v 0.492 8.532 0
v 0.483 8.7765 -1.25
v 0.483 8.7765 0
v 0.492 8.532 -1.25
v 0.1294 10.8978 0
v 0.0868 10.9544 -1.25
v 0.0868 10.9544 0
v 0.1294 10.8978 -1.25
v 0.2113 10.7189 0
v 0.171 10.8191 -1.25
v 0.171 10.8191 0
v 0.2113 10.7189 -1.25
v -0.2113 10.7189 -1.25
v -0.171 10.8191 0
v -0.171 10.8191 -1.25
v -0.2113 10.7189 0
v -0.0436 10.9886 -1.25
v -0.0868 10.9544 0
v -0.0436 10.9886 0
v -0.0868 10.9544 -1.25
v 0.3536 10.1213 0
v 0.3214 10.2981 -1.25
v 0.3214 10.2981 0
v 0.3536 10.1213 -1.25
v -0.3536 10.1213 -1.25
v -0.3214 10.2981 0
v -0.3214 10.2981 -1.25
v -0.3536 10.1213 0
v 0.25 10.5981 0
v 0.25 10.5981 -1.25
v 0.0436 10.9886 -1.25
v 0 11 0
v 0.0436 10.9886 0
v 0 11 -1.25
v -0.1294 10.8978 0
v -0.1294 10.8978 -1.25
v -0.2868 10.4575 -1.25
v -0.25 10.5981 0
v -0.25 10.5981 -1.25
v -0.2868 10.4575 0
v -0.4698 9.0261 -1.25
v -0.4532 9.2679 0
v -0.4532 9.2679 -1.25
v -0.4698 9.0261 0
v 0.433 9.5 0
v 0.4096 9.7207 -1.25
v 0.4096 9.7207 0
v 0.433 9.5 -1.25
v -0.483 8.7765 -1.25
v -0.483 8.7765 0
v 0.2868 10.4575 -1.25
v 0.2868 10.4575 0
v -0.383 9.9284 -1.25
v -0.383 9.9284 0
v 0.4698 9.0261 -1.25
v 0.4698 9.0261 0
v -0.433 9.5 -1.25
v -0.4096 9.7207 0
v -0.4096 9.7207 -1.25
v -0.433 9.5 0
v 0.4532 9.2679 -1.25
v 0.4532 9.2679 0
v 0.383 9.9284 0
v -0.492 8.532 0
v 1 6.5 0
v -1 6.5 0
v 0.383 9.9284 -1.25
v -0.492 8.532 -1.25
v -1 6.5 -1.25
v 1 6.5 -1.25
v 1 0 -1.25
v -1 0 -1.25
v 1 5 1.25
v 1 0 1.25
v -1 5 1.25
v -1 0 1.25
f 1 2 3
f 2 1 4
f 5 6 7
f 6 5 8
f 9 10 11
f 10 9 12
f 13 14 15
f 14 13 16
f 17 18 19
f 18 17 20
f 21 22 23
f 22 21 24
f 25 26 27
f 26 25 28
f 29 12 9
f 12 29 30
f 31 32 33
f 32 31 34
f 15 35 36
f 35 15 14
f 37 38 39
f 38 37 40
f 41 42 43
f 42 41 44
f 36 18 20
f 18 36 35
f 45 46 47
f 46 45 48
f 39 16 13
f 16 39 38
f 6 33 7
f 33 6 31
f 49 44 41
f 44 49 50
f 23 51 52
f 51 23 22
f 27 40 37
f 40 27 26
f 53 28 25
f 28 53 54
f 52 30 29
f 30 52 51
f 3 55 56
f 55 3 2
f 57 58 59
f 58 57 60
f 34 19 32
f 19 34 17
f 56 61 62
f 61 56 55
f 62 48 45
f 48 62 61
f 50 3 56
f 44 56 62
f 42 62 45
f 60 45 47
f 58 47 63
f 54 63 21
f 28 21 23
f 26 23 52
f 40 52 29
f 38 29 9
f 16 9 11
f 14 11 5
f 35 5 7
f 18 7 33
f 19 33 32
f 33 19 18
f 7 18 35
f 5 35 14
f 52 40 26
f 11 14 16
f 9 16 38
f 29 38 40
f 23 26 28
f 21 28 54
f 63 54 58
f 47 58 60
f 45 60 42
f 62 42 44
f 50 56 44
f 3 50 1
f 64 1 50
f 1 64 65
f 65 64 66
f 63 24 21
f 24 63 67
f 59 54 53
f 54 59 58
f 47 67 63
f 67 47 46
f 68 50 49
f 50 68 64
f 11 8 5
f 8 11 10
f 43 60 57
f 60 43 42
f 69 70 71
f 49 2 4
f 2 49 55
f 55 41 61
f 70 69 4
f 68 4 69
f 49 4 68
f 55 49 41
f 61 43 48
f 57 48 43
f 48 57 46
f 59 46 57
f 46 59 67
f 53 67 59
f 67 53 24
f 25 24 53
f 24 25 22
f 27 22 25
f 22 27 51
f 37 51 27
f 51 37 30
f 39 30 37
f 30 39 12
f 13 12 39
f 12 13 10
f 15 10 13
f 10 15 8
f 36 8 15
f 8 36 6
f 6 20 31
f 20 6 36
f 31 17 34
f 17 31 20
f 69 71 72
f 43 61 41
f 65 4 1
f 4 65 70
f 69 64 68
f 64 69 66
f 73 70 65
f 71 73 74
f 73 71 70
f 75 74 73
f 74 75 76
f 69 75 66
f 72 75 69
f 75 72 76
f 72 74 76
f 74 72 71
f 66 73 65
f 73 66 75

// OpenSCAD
$fn = 72;


tailSegment(h=4.5);
//blade();

module tailSegment(h=4.5)
{
	translate([0, 4.5, 0])
	union()
	{
		base();
		translate([0, 0.5, 0])
		wedge(height=h);
		translate([0, (h * (2/3)) + 0.5, -.625])
		spine(height=h);
	}
}

module spine(height)
{
	h = height * (2/3);
	scale([1, h*2, 1])
	cylinder(d=1, h=1.25, center=true);
	
	translate([0, -1.5, 0])
	linear_extrude(height=1.25, center=true)
	polygon(points=[[-1, 0], [1, 0], [0, 4]]);
}

module wedge(height)
{
	h = height * (1/3);
	rotate([0, -90, 0])
	linear_extrude(height=2, center=true)
	polygon(points=[[-1.25, 0], [1.25, 0], [0, h], [-1.25, h]]);
}

module base()
{
	translate([0, -2, 0])
	cube([2, 5, 2.5], center=true);
}

module blade()
{
	linear_extrude(height=2.5)
	polygon(points=[[-10, -5],[10, -5], [2.5, 0], [-2.5, 2.5], [-10, 5], [-8.75, 2.5], [-8.4, 0], [-8.75, -2.5]]);
}
